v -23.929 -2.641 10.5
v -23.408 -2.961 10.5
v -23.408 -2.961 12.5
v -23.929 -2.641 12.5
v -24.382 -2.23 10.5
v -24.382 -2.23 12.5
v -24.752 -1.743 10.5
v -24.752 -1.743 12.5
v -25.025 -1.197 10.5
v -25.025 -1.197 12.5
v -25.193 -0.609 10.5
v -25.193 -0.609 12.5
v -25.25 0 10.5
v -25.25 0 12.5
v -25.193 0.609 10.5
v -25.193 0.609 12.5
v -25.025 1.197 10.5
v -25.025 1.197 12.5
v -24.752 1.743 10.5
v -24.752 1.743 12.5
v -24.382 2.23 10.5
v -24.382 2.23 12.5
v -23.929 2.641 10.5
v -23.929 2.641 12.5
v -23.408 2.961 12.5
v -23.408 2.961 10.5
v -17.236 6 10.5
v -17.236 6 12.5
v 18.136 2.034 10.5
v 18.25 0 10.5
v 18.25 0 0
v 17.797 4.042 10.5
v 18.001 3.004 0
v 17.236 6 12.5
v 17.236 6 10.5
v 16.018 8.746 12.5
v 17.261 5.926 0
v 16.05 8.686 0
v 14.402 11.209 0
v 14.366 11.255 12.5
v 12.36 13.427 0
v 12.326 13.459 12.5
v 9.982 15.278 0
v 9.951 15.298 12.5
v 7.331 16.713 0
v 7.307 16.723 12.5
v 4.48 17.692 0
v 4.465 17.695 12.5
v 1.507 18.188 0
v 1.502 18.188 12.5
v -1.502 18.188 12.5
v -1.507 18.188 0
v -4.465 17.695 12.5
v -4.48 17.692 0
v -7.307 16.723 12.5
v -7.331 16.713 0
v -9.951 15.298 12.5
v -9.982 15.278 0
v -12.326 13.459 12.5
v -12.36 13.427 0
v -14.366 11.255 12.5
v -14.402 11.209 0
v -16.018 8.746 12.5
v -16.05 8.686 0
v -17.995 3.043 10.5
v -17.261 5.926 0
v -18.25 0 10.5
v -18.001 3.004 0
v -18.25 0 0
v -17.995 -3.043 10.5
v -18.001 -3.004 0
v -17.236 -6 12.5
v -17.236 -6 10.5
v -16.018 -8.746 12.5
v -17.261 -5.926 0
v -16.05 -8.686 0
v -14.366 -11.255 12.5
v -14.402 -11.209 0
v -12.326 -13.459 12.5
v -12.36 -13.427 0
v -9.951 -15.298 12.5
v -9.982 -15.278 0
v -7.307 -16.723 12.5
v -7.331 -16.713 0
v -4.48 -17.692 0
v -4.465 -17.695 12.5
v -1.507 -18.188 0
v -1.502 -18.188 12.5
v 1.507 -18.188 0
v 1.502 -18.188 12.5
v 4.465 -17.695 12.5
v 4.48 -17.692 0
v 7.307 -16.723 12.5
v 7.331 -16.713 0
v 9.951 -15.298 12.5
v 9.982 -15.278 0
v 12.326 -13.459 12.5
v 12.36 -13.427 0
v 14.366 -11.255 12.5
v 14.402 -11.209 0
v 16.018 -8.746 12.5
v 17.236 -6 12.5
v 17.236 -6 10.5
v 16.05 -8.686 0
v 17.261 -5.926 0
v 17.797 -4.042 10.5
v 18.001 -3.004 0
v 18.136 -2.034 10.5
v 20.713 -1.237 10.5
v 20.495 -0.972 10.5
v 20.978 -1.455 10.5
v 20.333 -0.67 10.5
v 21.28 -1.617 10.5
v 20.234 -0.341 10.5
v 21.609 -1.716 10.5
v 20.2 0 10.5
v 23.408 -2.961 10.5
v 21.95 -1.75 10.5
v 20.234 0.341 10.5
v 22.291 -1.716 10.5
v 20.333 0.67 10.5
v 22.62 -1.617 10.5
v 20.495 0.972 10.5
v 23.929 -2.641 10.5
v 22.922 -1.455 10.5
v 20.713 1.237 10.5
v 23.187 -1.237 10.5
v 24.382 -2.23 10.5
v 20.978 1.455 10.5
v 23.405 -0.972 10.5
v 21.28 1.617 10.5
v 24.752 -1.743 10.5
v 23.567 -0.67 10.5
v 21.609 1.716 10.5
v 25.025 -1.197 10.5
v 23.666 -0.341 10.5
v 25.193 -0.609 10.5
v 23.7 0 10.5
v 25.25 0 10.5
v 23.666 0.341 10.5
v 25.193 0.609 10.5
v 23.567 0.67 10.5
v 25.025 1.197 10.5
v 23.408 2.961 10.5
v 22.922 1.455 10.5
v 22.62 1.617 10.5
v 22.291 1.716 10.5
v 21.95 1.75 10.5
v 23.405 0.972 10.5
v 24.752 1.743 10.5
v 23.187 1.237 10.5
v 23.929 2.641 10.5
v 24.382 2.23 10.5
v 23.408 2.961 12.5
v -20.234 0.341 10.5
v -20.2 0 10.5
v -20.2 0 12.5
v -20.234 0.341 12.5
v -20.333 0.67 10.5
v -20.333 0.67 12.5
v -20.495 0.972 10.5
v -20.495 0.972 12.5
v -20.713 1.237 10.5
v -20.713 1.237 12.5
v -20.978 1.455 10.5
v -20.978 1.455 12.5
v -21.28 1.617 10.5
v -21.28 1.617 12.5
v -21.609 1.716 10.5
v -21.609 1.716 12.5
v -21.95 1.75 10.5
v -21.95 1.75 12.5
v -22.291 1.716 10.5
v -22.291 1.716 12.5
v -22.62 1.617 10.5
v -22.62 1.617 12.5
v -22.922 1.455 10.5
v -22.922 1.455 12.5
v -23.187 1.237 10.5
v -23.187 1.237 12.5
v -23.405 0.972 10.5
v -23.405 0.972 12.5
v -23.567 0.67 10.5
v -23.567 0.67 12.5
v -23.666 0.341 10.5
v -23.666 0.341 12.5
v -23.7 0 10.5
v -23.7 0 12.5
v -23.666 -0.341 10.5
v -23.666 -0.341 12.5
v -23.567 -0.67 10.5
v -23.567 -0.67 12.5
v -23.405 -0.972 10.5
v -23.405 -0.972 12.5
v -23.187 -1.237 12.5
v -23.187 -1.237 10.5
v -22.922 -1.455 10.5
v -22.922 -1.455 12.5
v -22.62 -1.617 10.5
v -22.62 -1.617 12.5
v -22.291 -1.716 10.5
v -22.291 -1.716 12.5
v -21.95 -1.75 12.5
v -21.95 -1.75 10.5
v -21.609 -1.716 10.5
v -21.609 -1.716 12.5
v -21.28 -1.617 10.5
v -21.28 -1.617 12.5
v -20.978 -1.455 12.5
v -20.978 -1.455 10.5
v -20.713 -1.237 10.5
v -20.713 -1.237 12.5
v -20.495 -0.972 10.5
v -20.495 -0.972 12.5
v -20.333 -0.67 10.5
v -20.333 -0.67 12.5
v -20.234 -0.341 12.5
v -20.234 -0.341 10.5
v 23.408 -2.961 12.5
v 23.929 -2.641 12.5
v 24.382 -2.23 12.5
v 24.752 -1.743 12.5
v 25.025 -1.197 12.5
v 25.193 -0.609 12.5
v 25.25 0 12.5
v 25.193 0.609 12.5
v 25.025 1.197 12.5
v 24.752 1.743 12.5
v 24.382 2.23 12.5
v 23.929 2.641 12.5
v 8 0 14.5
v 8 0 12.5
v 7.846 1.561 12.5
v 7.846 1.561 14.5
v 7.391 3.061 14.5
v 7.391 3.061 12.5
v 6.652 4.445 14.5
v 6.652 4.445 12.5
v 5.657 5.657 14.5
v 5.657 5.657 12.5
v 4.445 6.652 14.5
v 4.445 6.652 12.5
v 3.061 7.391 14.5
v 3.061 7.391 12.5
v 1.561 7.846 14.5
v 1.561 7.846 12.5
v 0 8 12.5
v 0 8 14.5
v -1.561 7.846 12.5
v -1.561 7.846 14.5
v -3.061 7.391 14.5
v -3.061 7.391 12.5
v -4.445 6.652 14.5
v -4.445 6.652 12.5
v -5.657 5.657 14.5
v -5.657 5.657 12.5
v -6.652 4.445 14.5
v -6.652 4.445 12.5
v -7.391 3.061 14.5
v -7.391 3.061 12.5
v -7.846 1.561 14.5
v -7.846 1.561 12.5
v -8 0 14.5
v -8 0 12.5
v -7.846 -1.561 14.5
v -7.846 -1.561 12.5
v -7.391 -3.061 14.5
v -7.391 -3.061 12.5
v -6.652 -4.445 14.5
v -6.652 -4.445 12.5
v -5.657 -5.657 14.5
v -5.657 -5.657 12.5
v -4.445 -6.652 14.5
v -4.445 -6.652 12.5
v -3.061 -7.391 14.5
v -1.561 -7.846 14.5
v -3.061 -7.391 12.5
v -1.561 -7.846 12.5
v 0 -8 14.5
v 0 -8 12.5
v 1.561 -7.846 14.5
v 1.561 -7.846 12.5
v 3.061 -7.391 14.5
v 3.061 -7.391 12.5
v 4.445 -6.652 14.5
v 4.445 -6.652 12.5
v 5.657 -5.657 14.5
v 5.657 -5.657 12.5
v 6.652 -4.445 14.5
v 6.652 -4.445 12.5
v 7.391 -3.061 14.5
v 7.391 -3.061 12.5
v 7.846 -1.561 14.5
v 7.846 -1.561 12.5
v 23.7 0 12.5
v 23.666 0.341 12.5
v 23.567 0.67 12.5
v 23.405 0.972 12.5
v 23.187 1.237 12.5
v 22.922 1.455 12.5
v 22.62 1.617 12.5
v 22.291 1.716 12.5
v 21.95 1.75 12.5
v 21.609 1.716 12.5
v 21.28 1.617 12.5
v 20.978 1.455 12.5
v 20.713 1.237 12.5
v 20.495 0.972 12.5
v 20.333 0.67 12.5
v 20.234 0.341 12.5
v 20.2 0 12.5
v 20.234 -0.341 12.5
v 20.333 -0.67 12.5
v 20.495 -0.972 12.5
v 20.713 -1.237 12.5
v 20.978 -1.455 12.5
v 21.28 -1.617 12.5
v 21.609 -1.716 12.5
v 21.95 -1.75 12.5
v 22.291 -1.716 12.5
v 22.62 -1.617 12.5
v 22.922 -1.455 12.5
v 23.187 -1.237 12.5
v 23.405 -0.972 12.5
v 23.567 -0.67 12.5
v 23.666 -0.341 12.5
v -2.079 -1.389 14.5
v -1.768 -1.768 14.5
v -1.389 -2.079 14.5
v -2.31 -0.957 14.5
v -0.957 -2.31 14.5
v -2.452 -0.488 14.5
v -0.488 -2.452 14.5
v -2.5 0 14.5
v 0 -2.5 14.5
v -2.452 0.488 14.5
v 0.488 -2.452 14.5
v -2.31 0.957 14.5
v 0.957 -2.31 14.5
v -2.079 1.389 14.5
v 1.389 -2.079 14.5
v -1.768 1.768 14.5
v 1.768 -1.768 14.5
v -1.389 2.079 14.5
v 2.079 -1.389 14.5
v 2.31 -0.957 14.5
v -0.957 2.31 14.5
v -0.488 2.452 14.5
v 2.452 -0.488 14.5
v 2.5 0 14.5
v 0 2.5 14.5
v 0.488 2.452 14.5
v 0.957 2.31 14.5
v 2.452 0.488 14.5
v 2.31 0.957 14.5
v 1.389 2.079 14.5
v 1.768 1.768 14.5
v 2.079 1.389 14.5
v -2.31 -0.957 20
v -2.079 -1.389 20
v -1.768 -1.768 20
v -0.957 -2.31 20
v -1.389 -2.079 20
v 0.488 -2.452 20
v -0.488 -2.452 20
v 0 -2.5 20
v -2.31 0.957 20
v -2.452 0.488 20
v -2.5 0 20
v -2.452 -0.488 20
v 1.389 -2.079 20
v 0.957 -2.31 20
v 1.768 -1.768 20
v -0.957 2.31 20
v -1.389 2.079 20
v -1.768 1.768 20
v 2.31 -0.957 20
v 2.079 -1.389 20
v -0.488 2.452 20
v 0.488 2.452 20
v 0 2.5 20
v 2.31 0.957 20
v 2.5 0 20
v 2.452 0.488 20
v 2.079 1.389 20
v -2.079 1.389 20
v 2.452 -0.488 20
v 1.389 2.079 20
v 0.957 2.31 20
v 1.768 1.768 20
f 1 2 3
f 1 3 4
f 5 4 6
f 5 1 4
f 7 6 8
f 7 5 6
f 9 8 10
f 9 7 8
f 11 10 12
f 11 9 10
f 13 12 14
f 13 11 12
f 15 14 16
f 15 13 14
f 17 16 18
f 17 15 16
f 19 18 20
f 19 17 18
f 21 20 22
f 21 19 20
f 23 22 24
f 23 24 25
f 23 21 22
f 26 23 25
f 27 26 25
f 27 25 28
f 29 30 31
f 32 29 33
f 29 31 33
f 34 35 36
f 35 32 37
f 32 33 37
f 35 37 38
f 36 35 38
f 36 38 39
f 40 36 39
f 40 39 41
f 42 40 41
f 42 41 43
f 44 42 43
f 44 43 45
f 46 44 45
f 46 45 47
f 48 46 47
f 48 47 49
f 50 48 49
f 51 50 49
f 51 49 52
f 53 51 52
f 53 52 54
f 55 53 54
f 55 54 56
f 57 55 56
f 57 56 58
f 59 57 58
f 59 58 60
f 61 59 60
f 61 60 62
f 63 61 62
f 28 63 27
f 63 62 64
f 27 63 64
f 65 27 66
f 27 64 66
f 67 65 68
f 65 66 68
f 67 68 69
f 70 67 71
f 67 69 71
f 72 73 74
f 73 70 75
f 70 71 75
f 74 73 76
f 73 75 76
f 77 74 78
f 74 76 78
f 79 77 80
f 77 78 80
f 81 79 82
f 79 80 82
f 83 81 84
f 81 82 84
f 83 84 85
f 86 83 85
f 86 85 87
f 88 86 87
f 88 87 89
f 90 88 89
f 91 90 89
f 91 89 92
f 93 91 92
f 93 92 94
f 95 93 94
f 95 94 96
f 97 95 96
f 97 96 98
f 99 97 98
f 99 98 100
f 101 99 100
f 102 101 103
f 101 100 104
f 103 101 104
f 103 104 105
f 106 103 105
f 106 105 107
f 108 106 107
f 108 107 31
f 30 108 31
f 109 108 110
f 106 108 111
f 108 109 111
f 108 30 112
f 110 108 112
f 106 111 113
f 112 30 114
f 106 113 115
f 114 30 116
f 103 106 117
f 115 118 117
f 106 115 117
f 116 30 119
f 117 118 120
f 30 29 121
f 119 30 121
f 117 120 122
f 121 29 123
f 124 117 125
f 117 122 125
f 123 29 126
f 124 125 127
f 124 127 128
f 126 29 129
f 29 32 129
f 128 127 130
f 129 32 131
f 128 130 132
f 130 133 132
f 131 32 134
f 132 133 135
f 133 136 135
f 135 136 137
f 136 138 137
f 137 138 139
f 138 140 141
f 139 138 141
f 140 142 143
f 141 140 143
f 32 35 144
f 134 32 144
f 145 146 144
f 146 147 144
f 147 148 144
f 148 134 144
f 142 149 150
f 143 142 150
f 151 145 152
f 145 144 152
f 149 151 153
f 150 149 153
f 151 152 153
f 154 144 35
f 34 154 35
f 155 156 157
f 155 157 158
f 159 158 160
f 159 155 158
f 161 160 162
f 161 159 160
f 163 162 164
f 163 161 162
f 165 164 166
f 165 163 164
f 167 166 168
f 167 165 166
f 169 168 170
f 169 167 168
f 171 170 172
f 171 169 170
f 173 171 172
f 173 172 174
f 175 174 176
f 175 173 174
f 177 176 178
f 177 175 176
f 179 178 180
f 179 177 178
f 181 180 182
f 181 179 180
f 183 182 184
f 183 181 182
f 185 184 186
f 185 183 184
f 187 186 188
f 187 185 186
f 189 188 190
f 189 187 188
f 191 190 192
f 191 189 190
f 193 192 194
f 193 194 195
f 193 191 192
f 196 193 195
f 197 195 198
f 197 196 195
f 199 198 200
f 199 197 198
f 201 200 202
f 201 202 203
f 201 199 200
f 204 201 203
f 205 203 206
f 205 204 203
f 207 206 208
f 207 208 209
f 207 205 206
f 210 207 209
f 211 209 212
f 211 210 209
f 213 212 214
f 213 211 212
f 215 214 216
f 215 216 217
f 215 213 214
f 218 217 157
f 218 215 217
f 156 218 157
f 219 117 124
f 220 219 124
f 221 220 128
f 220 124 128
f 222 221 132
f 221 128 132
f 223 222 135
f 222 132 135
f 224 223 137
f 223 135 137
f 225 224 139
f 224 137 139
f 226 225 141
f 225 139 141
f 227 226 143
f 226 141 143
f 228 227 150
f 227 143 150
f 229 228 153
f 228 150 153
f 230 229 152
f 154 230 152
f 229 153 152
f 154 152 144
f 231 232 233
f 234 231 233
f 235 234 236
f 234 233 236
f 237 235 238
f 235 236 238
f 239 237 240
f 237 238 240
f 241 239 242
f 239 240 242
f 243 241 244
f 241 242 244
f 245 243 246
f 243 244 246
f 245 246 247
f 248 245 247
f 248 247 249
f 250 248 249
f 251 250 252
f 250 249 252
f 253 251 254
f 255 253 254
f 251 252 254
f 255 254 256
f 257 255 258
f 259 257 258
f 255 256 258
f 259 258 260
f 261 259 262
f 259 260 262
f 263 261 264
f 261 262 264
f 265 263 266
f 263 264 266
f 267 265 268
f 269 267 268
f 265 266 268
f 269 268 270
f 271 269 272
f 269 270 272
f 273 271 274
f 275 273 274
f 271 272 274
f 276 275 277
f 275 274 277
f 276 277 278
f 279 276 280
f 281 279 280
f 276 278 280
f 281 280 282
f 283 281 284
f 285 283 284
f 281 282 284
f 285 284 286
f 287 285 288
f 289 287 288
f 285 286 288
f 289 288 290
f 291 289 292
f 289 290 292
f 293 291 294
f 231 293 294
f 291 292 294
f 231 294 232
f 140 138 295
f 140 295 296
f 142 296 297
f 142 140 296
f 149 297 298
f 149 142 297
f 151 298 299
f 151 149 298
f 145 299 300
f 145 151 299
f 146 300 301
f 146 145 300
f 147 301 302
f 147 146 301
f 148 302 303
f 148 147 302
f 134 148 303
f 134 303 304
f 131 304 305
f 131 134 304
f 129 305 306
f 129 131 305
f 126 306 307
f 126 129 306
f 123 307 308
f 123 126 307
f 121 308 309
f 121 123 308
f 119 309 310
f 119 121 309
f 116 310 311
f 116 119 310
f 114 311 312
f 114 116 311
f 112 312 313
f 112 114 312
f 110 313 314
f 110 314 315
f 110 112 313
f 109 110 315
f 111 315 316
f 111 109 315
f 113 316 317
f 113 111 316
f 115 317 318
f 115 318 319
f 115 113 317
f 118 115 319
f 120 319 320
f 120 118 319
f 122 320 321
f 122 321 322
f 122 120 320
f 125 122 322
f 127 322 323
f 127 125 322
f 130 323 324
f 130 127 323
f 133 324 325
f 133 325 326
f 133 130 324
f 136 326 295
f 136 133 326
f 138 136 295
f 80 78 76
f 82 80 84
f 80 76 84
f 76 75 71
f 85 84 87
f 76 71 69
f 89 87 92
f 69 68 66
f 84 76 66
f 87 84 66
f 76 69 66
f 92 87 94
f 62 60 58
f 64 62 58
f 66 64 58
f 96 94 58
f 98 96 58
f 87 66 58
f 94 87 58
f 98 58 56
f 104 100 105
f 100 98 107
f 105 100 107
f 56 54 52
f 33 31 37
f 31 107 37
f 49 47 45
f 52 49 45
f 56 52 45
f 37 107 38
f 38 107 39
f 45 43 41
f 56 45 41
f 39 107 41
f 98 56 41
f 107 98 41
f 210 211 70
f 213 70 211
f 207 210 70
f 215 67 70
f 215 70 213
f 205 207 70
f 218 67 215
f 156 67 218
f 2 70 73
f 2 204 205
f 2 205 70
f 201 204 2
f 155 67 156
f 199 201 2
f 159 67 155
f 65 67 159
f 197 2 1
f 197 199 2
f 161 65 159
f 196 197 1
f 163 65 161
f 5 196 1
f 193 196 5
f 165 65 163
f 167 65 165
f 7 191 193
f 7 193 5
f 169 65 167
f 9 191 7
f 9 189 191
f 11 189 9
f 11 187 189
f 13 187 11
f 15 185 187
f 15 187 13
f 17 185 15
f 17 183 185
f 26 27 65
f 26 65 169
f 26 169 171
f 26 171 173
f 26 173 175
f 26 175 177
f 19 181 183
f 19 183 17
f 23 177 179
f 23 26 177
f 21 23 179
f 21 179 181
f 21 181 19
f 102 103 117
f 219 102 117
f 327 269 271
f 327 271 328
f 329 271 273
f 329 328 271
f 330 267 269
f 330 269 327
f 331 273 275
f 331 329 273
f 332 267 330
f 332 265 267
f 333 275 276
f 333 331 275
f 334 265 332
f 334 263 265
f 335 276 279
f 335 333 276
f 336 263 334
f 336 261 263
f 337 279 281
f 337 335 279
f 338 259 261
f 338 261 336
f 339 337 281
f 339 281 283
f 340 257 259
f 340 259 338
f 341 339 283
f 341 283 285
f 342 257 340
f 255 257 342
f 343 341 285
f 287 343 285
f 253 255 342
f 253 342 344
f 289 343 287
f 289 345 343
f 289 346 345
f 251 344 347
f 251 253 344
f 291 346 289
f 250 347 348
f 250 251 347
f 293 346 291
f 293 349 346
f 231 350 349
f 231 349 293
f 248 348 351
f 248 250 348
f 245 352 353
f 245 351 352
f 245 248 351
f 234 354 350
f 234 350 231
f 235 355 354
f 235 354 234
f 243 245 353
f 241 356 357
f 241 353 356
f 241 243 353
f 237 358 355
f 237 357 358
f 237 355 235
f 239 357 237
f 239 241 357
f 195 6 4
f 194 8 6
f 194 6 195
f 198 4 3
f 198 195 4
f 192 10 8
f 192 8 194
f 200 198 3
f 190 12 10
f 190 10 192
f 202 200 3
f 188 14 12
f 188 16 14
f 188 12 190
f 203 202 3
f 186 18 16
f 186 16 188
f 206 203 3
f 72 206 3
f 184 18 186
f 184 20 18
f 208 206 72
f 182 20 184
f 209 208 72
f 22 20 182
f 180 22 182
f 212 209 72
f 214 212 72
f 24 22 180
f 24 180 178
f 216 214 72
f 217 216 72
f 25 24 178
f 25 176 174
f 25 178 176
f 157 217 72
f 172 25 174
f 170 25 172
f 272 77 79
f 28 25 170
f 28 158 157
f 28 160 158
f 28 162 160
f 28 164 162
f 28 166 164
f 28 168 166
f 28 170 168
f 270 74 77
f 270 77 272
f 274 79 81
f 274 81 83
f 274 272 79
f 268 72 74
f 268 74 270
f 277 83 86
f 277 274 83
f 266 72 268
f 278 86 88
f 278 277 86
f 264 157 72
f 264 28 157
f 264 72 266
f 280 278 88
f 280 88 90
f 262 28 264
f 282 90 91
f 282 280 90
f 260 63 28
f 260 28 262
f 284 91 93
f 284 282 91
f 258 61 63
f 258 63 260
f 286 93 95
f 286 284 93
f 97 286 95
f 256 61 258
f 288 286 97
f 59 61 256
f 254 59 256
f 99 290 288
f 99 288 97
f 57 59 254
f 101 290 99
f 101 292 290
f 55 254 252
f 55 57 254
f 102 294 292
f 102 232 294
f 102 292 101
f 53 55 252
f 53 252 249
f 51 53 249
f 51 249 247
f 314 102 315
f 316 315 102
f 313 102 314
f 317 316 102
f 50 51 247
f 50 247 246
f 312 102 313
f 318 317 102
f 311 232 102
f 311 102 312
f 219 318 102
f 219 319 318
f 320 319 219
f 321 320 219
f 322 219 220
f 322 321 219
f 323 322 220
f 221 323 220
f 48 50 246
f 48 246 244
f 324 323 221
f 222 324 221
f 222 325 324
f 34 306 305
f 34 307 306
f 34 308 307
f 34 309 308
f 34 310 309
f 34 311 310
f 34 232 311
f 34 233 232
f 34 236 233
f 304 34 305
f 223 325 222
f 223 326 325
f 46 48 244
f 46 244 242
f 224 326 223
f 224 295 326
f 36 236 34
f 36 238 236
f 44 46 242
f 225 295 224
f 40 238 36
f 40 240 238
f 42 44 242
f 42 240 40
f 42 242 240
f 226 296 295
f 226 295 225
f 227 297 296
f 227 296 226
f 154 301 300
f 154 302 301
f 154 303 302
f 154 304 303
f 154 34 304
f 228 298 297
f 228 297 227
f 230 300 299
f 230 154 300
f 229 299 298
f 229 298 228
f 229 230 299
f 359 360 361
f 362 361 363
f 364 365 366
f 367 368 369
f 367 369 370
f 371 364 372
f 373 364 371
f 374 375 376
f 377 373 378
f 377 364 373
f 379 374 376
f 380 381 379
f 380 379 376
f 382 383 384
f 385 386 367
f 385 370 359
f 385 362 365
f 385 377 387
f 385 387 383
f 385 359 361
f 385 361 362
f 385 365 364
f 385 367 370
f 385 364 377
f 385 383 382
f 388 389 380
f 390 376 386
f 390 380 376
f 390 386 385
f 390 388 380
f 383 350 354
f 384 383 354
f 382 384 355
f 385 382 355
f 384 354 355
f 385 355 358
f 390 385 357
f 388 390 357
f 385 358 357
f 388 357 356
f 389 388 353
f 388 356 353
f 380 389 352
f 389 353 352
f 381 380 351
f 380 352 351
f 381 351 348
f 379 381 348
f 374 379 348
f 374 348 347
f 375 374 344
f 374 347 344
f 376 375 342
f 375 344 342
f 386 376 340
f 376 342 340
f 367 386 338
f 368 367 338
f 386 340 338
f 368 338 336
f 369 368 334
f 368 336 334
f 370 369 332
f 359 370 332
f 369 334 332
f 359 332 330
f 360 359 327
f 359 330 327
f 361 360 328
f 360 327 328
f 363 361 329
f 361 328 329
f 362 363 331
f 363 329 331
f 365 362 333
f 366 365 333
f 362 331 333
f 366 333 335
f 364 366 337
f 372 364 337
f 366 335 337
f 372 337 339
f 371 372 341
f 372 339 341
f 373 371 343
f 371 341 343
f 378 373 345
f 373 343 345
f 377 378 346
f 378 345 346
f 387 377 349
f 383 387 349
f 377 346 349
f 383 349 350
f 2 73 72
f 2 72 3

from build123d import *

# Parameters (mm, degrees)
SKETCH1_R           = 18.25
BOSS_EXTRUDE1_DEPTH = 12.5
BOSS_EXTRUDE2_START = -2
SKETCH2_R           = 1.75
BOSS_EXTRUDE2_DEPTH = 2
SKETCH3_R           = 8
BOSS_EXTRUDE3_DEPTH = 2
SKETCH4_R           = 2.5
BOSS_EXTRUDE4_DEPTH = 5.5


with BuildPart() as part:
    # Sketch1 → Boss-Extrude1 (new body)
    with BuildSketch(Plane.XY):
        Circle(SKETCH1_R)
    extrude(amount=BOSS_EXTRUDE1_DEPTH)

    # Sketch2 → Boss-Extrude2 (add)
    # profile 1 of 2: a face of its own
    with BuildSketch(Plane.XY.offset(12.5).offset(BOSS_EXTRUDE2_START)):
        with BuildLine():
            Line((-23.407860756, 2.960513809), (-17.235501153, 6))
            ThreePointArc((-17.235501153, 6), (-18.25, 0), (-17.235501153, -6))
            Line((-17.235501153, -6), (-23.407860756, -2.960513809))
            ThreePointArc((-23.407860756, -2.960513809), (-25.25, 0), (-23.407860756, 2.960513809))
        make_face()
        with Locations((-21.95, 0)):
            Circle(SKETCH2_R, mode=Mode.SUBTRACT)
    # profile 2 of 2: a face of its own
    with BuildSketch(Plane.XY.offset(12.5).offset(BOSS_EXTRUDE2_START)):
        with BuildLine():
            Line((23.407860756, 2.960513809), (17.235501153, 6))
            ThreePointArc((17.235501153, 6), (18.25, 0), (17.235501153, -6))
            Line((17.235501153, -6), (23.407860756, -2.960513809))
            ThreePointArc((23.407860756, -2.960513809), (25.25, 0), (23.407860756, 2.960513809))
        make_face()
        with Locations((21.95, 0)):
            Circle(SKETCH2_R, mode=Mode.SUBTRACT)
    extrude(amount=BOSS_EXTRUDE2_DEPTH)

    # Sketch3 → Boss-Extrude3 (add)
    with BuildSketch(Plane.XY.offset(12.5)):
        Circle(SKETCH3_R)
    extrude(amount=BOSS_EXTRUDE3_DEPTH)

    # Sketch4 → Boss-Extrude4 (add)
    with BuildSketch(Plane.XY.offset(14.5)):
        Circle(SKETCH4_R)
    extrude(amount=BOSS_EXTRUDE4_DEPTH)


solid = part.part
